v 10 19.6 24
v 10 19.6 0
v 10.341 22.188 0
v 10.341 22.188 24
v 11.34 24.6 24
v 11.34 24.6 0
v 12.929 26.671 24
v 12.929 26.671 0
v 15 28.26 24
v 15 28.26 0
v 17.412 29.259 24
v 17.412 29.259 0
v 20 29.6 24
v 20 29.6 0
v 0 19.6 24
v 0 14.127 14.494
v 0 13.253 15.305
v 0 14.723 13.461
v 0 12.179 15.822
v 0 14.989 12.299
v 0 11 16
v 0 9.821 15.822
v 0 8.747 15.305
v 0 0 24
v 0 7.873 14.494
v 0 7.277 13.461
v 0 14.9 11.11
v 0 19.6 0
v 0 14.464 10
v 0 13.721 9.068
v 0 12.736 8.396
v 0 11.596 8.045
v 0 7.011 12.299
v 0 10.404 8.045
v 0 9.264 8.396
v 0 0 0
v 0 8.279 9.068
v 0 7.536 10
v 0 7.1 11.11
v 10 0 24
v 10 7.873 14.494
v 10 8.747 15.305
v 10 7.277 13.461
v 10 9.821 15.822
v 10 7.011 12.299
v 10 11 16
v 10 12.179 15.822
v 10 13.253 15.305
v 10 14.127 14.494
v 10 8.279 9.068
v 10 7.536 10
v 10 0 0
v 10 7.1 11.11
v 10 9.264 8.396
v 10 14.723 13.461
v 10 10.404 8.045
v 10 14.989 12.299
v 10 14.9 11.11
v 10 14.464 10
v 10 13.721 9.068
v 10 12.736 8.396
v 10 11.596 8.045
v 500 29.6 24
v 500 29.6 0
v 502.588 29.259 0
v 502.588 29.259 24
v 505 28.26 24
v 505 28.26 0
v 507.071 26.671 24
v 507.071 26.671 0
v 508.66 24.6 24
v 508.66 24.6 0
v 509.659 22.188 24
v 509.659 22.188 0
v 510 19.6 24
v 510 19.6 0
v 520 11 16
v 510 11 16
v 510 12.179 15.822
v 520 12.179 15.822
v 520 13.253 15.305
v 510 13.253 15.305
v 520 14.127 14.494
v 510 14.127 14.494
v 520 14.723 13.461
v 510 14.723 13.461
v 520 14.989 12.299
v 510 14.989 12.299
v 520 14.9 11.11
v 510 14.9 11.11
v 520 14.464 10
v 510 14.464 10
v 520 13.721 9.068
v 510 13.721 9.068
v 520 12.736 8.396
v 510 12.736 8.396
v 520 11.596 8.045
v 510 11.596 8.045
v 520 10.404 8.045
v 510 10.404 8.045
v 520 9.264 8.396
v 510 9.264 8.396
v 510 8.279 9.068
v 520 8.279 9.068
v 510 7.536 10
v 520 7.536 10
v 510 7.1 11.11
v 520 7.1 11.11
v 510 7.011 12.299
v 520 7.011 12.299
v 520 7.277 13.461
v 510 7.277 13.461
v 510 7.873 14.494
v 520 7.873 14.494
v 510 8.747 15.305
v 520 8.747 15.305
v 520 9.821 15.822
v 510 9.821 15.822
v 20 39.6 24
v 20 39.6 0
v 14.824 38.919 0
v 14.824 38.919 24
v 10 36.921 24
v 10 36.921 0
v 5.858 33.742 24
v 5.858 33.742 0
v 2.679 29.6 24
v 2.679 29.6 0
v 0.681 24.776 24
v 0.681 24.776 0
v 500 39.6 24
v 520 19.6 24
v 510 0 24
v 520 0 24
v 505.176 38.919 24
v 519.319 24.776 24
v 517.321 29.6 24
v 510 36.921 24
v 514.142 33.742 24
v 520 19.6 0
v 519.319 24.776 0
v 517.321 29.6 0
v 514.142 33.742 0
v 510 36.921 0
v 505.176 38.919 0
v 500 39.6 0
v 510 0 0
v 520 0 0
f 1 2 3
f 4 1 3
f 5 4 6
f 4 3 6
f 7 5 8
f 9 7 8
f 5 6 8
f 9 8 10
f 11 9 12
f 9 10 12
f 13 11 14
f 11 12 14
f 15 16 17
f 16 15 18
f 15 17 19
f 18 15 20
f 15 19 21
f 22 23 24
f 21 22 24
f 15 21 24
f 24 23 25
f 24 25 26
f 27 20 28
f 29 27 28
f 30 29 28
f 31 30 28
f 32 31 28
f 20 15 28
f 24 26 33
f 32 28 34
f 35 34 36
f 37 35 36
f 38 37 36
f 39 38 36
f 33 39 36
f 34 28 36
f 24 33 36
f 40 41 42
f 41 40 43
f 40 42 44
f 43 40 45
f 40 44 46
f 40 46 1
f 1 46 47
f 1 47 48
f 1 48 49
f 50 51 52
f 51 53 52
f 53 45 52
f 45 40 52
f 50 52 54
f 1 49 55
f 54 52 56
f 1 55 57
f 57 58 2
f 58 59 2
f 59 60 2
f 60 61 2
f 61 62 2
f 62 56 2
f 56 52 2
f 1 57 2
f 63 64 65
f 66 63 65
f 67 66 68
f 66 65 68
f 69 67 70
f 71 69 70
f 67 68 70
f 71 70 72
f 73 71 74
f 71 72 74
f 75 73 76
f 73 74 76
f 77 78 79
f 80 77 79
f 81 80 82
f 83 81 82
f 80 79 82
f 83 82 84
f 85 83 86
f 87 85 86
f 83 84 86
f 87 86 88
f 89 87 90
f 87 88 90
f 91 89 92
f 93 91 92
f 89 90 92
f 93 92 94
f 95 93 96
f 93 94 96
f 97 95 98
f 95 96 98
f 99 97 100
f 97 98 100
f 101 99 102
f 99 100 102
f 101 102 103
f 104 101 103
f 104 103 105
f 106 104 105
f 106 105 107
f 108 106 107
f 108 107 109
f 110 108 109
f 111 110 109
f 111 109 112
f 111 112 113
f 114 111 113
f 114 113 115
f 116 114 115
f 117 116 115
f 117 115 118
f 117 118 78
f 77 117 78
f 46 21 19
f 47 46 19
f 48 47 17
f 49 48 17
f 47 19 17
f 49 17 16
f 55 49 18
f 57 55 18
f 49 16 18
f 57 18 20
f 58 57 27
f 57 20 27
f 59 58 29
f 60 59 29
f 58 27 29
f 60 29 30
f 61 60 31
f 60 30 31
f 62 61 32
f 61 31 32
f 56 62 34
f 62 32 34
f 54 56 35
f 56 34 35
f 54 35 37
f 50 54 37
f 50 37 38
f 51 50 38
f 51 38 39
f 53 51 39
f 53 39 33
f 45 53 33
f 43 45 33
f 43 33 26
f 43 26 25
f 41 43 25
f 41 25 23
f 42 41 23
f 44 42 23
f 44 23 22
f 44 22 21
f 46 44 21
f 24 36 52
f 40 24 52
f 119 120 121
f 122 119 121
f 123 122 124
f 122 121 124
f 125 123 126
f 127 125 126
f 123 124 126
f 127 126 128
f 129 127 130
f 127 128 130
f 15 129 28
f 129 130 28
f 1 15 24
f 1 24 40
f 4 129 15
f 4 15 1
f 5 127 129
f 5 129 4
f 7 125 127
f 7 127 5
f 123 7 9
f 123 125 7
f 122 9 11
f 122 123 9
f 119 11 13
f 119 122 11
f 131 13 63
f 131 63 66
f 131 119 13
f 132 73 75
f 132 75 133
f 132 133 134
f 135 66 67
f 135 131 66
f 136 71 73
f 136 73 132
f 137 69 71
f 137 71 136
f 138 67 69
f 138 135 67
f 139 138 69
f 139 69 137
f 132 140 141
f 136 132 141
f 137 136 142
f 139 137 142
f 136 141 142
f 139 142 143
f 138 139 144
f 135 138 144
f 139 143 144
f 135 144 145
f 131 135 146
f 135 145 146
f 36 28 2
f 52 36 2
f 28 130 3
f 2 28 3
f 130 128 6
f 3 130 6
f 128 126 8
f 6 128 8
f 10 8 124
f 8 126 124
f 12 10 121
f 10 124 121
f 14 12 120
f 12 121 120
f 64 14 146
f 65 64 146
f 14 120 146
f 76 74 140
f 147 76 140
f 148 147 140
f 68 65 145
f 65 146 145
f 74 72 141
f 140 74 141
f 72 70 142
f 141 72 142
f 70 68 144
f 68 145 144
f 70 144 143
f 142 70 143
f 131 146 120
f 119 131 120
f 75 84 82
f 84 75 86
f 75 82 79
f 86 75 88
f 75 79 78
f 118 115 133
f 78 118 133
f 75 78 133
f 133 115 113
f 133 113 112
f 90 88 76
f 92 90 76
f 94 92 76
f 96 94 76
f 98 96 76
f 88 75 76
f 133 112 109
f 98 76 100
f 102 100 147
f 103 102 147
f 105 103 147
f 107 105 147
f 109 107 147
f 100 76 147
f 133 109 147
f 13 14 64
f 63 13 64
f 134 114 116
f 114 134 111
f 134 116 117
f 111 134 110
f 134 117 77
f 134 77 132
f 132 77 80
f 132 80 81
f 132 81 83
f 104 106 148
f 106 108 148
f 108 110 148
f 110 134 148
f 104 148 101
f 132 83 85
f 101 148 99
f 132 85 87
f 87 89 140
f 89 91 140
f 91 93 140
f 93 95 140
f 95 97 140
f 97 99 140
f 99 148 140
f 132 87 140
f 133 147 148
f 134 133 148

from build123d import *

# Parameters (mm, degrees)
BOSS_EXTRUDE2_DEPTH = 24
SKETCH2_R           = 4
CUT_EXTRUDE1_DEPTH  = 523.057621341


with BuildPart() as part:
    # Sketch1 → Boss-Extrude2 (new body)
    with BuildSketch(Plane.XY):
        with BuildLine():
            Line((20, 29.6), (500, 29.6))
            ThreePointArc((500, 29.6), (507.071067812, 26.671067812), (510, 19.6))
            Line((510, 19.6), (510, 0))
            Line((510, 0), (520, 0))
            Line((520, 0), (520, 19.6))
            ThreePointArc((520, 19.6), (514.142135624, 33.742135624), (500, 39.6))
            Line((500, 39.6), (20, 39.6))
            ThreePointArc((20, 39.6), (5.857864376, 33.742135624), (0, 19.6))
            Line((0, 19.6), (0, 0))
            Line((0, 0), (10, 0))
            Line((10, 0), (10, 19.6))
            ThreePointArc((10, 19.6), (12.928932188, 26.671067812), (20, 29.6))
        make_face()
    extrude(amount=BOSS_EXTRUDE2_DEPTH)

    # Sketch2 → Cut-Extrude1 (cut, through all)
    with BuildSketch(Plane.ZY):
        with Locations((12, 11)):
            Circle(SKETCH2_R)
    extrude(amount=-CUT_EXTRUDE1_DEPTH, mode=Mode.SUBTRACT)


solid = part.part
